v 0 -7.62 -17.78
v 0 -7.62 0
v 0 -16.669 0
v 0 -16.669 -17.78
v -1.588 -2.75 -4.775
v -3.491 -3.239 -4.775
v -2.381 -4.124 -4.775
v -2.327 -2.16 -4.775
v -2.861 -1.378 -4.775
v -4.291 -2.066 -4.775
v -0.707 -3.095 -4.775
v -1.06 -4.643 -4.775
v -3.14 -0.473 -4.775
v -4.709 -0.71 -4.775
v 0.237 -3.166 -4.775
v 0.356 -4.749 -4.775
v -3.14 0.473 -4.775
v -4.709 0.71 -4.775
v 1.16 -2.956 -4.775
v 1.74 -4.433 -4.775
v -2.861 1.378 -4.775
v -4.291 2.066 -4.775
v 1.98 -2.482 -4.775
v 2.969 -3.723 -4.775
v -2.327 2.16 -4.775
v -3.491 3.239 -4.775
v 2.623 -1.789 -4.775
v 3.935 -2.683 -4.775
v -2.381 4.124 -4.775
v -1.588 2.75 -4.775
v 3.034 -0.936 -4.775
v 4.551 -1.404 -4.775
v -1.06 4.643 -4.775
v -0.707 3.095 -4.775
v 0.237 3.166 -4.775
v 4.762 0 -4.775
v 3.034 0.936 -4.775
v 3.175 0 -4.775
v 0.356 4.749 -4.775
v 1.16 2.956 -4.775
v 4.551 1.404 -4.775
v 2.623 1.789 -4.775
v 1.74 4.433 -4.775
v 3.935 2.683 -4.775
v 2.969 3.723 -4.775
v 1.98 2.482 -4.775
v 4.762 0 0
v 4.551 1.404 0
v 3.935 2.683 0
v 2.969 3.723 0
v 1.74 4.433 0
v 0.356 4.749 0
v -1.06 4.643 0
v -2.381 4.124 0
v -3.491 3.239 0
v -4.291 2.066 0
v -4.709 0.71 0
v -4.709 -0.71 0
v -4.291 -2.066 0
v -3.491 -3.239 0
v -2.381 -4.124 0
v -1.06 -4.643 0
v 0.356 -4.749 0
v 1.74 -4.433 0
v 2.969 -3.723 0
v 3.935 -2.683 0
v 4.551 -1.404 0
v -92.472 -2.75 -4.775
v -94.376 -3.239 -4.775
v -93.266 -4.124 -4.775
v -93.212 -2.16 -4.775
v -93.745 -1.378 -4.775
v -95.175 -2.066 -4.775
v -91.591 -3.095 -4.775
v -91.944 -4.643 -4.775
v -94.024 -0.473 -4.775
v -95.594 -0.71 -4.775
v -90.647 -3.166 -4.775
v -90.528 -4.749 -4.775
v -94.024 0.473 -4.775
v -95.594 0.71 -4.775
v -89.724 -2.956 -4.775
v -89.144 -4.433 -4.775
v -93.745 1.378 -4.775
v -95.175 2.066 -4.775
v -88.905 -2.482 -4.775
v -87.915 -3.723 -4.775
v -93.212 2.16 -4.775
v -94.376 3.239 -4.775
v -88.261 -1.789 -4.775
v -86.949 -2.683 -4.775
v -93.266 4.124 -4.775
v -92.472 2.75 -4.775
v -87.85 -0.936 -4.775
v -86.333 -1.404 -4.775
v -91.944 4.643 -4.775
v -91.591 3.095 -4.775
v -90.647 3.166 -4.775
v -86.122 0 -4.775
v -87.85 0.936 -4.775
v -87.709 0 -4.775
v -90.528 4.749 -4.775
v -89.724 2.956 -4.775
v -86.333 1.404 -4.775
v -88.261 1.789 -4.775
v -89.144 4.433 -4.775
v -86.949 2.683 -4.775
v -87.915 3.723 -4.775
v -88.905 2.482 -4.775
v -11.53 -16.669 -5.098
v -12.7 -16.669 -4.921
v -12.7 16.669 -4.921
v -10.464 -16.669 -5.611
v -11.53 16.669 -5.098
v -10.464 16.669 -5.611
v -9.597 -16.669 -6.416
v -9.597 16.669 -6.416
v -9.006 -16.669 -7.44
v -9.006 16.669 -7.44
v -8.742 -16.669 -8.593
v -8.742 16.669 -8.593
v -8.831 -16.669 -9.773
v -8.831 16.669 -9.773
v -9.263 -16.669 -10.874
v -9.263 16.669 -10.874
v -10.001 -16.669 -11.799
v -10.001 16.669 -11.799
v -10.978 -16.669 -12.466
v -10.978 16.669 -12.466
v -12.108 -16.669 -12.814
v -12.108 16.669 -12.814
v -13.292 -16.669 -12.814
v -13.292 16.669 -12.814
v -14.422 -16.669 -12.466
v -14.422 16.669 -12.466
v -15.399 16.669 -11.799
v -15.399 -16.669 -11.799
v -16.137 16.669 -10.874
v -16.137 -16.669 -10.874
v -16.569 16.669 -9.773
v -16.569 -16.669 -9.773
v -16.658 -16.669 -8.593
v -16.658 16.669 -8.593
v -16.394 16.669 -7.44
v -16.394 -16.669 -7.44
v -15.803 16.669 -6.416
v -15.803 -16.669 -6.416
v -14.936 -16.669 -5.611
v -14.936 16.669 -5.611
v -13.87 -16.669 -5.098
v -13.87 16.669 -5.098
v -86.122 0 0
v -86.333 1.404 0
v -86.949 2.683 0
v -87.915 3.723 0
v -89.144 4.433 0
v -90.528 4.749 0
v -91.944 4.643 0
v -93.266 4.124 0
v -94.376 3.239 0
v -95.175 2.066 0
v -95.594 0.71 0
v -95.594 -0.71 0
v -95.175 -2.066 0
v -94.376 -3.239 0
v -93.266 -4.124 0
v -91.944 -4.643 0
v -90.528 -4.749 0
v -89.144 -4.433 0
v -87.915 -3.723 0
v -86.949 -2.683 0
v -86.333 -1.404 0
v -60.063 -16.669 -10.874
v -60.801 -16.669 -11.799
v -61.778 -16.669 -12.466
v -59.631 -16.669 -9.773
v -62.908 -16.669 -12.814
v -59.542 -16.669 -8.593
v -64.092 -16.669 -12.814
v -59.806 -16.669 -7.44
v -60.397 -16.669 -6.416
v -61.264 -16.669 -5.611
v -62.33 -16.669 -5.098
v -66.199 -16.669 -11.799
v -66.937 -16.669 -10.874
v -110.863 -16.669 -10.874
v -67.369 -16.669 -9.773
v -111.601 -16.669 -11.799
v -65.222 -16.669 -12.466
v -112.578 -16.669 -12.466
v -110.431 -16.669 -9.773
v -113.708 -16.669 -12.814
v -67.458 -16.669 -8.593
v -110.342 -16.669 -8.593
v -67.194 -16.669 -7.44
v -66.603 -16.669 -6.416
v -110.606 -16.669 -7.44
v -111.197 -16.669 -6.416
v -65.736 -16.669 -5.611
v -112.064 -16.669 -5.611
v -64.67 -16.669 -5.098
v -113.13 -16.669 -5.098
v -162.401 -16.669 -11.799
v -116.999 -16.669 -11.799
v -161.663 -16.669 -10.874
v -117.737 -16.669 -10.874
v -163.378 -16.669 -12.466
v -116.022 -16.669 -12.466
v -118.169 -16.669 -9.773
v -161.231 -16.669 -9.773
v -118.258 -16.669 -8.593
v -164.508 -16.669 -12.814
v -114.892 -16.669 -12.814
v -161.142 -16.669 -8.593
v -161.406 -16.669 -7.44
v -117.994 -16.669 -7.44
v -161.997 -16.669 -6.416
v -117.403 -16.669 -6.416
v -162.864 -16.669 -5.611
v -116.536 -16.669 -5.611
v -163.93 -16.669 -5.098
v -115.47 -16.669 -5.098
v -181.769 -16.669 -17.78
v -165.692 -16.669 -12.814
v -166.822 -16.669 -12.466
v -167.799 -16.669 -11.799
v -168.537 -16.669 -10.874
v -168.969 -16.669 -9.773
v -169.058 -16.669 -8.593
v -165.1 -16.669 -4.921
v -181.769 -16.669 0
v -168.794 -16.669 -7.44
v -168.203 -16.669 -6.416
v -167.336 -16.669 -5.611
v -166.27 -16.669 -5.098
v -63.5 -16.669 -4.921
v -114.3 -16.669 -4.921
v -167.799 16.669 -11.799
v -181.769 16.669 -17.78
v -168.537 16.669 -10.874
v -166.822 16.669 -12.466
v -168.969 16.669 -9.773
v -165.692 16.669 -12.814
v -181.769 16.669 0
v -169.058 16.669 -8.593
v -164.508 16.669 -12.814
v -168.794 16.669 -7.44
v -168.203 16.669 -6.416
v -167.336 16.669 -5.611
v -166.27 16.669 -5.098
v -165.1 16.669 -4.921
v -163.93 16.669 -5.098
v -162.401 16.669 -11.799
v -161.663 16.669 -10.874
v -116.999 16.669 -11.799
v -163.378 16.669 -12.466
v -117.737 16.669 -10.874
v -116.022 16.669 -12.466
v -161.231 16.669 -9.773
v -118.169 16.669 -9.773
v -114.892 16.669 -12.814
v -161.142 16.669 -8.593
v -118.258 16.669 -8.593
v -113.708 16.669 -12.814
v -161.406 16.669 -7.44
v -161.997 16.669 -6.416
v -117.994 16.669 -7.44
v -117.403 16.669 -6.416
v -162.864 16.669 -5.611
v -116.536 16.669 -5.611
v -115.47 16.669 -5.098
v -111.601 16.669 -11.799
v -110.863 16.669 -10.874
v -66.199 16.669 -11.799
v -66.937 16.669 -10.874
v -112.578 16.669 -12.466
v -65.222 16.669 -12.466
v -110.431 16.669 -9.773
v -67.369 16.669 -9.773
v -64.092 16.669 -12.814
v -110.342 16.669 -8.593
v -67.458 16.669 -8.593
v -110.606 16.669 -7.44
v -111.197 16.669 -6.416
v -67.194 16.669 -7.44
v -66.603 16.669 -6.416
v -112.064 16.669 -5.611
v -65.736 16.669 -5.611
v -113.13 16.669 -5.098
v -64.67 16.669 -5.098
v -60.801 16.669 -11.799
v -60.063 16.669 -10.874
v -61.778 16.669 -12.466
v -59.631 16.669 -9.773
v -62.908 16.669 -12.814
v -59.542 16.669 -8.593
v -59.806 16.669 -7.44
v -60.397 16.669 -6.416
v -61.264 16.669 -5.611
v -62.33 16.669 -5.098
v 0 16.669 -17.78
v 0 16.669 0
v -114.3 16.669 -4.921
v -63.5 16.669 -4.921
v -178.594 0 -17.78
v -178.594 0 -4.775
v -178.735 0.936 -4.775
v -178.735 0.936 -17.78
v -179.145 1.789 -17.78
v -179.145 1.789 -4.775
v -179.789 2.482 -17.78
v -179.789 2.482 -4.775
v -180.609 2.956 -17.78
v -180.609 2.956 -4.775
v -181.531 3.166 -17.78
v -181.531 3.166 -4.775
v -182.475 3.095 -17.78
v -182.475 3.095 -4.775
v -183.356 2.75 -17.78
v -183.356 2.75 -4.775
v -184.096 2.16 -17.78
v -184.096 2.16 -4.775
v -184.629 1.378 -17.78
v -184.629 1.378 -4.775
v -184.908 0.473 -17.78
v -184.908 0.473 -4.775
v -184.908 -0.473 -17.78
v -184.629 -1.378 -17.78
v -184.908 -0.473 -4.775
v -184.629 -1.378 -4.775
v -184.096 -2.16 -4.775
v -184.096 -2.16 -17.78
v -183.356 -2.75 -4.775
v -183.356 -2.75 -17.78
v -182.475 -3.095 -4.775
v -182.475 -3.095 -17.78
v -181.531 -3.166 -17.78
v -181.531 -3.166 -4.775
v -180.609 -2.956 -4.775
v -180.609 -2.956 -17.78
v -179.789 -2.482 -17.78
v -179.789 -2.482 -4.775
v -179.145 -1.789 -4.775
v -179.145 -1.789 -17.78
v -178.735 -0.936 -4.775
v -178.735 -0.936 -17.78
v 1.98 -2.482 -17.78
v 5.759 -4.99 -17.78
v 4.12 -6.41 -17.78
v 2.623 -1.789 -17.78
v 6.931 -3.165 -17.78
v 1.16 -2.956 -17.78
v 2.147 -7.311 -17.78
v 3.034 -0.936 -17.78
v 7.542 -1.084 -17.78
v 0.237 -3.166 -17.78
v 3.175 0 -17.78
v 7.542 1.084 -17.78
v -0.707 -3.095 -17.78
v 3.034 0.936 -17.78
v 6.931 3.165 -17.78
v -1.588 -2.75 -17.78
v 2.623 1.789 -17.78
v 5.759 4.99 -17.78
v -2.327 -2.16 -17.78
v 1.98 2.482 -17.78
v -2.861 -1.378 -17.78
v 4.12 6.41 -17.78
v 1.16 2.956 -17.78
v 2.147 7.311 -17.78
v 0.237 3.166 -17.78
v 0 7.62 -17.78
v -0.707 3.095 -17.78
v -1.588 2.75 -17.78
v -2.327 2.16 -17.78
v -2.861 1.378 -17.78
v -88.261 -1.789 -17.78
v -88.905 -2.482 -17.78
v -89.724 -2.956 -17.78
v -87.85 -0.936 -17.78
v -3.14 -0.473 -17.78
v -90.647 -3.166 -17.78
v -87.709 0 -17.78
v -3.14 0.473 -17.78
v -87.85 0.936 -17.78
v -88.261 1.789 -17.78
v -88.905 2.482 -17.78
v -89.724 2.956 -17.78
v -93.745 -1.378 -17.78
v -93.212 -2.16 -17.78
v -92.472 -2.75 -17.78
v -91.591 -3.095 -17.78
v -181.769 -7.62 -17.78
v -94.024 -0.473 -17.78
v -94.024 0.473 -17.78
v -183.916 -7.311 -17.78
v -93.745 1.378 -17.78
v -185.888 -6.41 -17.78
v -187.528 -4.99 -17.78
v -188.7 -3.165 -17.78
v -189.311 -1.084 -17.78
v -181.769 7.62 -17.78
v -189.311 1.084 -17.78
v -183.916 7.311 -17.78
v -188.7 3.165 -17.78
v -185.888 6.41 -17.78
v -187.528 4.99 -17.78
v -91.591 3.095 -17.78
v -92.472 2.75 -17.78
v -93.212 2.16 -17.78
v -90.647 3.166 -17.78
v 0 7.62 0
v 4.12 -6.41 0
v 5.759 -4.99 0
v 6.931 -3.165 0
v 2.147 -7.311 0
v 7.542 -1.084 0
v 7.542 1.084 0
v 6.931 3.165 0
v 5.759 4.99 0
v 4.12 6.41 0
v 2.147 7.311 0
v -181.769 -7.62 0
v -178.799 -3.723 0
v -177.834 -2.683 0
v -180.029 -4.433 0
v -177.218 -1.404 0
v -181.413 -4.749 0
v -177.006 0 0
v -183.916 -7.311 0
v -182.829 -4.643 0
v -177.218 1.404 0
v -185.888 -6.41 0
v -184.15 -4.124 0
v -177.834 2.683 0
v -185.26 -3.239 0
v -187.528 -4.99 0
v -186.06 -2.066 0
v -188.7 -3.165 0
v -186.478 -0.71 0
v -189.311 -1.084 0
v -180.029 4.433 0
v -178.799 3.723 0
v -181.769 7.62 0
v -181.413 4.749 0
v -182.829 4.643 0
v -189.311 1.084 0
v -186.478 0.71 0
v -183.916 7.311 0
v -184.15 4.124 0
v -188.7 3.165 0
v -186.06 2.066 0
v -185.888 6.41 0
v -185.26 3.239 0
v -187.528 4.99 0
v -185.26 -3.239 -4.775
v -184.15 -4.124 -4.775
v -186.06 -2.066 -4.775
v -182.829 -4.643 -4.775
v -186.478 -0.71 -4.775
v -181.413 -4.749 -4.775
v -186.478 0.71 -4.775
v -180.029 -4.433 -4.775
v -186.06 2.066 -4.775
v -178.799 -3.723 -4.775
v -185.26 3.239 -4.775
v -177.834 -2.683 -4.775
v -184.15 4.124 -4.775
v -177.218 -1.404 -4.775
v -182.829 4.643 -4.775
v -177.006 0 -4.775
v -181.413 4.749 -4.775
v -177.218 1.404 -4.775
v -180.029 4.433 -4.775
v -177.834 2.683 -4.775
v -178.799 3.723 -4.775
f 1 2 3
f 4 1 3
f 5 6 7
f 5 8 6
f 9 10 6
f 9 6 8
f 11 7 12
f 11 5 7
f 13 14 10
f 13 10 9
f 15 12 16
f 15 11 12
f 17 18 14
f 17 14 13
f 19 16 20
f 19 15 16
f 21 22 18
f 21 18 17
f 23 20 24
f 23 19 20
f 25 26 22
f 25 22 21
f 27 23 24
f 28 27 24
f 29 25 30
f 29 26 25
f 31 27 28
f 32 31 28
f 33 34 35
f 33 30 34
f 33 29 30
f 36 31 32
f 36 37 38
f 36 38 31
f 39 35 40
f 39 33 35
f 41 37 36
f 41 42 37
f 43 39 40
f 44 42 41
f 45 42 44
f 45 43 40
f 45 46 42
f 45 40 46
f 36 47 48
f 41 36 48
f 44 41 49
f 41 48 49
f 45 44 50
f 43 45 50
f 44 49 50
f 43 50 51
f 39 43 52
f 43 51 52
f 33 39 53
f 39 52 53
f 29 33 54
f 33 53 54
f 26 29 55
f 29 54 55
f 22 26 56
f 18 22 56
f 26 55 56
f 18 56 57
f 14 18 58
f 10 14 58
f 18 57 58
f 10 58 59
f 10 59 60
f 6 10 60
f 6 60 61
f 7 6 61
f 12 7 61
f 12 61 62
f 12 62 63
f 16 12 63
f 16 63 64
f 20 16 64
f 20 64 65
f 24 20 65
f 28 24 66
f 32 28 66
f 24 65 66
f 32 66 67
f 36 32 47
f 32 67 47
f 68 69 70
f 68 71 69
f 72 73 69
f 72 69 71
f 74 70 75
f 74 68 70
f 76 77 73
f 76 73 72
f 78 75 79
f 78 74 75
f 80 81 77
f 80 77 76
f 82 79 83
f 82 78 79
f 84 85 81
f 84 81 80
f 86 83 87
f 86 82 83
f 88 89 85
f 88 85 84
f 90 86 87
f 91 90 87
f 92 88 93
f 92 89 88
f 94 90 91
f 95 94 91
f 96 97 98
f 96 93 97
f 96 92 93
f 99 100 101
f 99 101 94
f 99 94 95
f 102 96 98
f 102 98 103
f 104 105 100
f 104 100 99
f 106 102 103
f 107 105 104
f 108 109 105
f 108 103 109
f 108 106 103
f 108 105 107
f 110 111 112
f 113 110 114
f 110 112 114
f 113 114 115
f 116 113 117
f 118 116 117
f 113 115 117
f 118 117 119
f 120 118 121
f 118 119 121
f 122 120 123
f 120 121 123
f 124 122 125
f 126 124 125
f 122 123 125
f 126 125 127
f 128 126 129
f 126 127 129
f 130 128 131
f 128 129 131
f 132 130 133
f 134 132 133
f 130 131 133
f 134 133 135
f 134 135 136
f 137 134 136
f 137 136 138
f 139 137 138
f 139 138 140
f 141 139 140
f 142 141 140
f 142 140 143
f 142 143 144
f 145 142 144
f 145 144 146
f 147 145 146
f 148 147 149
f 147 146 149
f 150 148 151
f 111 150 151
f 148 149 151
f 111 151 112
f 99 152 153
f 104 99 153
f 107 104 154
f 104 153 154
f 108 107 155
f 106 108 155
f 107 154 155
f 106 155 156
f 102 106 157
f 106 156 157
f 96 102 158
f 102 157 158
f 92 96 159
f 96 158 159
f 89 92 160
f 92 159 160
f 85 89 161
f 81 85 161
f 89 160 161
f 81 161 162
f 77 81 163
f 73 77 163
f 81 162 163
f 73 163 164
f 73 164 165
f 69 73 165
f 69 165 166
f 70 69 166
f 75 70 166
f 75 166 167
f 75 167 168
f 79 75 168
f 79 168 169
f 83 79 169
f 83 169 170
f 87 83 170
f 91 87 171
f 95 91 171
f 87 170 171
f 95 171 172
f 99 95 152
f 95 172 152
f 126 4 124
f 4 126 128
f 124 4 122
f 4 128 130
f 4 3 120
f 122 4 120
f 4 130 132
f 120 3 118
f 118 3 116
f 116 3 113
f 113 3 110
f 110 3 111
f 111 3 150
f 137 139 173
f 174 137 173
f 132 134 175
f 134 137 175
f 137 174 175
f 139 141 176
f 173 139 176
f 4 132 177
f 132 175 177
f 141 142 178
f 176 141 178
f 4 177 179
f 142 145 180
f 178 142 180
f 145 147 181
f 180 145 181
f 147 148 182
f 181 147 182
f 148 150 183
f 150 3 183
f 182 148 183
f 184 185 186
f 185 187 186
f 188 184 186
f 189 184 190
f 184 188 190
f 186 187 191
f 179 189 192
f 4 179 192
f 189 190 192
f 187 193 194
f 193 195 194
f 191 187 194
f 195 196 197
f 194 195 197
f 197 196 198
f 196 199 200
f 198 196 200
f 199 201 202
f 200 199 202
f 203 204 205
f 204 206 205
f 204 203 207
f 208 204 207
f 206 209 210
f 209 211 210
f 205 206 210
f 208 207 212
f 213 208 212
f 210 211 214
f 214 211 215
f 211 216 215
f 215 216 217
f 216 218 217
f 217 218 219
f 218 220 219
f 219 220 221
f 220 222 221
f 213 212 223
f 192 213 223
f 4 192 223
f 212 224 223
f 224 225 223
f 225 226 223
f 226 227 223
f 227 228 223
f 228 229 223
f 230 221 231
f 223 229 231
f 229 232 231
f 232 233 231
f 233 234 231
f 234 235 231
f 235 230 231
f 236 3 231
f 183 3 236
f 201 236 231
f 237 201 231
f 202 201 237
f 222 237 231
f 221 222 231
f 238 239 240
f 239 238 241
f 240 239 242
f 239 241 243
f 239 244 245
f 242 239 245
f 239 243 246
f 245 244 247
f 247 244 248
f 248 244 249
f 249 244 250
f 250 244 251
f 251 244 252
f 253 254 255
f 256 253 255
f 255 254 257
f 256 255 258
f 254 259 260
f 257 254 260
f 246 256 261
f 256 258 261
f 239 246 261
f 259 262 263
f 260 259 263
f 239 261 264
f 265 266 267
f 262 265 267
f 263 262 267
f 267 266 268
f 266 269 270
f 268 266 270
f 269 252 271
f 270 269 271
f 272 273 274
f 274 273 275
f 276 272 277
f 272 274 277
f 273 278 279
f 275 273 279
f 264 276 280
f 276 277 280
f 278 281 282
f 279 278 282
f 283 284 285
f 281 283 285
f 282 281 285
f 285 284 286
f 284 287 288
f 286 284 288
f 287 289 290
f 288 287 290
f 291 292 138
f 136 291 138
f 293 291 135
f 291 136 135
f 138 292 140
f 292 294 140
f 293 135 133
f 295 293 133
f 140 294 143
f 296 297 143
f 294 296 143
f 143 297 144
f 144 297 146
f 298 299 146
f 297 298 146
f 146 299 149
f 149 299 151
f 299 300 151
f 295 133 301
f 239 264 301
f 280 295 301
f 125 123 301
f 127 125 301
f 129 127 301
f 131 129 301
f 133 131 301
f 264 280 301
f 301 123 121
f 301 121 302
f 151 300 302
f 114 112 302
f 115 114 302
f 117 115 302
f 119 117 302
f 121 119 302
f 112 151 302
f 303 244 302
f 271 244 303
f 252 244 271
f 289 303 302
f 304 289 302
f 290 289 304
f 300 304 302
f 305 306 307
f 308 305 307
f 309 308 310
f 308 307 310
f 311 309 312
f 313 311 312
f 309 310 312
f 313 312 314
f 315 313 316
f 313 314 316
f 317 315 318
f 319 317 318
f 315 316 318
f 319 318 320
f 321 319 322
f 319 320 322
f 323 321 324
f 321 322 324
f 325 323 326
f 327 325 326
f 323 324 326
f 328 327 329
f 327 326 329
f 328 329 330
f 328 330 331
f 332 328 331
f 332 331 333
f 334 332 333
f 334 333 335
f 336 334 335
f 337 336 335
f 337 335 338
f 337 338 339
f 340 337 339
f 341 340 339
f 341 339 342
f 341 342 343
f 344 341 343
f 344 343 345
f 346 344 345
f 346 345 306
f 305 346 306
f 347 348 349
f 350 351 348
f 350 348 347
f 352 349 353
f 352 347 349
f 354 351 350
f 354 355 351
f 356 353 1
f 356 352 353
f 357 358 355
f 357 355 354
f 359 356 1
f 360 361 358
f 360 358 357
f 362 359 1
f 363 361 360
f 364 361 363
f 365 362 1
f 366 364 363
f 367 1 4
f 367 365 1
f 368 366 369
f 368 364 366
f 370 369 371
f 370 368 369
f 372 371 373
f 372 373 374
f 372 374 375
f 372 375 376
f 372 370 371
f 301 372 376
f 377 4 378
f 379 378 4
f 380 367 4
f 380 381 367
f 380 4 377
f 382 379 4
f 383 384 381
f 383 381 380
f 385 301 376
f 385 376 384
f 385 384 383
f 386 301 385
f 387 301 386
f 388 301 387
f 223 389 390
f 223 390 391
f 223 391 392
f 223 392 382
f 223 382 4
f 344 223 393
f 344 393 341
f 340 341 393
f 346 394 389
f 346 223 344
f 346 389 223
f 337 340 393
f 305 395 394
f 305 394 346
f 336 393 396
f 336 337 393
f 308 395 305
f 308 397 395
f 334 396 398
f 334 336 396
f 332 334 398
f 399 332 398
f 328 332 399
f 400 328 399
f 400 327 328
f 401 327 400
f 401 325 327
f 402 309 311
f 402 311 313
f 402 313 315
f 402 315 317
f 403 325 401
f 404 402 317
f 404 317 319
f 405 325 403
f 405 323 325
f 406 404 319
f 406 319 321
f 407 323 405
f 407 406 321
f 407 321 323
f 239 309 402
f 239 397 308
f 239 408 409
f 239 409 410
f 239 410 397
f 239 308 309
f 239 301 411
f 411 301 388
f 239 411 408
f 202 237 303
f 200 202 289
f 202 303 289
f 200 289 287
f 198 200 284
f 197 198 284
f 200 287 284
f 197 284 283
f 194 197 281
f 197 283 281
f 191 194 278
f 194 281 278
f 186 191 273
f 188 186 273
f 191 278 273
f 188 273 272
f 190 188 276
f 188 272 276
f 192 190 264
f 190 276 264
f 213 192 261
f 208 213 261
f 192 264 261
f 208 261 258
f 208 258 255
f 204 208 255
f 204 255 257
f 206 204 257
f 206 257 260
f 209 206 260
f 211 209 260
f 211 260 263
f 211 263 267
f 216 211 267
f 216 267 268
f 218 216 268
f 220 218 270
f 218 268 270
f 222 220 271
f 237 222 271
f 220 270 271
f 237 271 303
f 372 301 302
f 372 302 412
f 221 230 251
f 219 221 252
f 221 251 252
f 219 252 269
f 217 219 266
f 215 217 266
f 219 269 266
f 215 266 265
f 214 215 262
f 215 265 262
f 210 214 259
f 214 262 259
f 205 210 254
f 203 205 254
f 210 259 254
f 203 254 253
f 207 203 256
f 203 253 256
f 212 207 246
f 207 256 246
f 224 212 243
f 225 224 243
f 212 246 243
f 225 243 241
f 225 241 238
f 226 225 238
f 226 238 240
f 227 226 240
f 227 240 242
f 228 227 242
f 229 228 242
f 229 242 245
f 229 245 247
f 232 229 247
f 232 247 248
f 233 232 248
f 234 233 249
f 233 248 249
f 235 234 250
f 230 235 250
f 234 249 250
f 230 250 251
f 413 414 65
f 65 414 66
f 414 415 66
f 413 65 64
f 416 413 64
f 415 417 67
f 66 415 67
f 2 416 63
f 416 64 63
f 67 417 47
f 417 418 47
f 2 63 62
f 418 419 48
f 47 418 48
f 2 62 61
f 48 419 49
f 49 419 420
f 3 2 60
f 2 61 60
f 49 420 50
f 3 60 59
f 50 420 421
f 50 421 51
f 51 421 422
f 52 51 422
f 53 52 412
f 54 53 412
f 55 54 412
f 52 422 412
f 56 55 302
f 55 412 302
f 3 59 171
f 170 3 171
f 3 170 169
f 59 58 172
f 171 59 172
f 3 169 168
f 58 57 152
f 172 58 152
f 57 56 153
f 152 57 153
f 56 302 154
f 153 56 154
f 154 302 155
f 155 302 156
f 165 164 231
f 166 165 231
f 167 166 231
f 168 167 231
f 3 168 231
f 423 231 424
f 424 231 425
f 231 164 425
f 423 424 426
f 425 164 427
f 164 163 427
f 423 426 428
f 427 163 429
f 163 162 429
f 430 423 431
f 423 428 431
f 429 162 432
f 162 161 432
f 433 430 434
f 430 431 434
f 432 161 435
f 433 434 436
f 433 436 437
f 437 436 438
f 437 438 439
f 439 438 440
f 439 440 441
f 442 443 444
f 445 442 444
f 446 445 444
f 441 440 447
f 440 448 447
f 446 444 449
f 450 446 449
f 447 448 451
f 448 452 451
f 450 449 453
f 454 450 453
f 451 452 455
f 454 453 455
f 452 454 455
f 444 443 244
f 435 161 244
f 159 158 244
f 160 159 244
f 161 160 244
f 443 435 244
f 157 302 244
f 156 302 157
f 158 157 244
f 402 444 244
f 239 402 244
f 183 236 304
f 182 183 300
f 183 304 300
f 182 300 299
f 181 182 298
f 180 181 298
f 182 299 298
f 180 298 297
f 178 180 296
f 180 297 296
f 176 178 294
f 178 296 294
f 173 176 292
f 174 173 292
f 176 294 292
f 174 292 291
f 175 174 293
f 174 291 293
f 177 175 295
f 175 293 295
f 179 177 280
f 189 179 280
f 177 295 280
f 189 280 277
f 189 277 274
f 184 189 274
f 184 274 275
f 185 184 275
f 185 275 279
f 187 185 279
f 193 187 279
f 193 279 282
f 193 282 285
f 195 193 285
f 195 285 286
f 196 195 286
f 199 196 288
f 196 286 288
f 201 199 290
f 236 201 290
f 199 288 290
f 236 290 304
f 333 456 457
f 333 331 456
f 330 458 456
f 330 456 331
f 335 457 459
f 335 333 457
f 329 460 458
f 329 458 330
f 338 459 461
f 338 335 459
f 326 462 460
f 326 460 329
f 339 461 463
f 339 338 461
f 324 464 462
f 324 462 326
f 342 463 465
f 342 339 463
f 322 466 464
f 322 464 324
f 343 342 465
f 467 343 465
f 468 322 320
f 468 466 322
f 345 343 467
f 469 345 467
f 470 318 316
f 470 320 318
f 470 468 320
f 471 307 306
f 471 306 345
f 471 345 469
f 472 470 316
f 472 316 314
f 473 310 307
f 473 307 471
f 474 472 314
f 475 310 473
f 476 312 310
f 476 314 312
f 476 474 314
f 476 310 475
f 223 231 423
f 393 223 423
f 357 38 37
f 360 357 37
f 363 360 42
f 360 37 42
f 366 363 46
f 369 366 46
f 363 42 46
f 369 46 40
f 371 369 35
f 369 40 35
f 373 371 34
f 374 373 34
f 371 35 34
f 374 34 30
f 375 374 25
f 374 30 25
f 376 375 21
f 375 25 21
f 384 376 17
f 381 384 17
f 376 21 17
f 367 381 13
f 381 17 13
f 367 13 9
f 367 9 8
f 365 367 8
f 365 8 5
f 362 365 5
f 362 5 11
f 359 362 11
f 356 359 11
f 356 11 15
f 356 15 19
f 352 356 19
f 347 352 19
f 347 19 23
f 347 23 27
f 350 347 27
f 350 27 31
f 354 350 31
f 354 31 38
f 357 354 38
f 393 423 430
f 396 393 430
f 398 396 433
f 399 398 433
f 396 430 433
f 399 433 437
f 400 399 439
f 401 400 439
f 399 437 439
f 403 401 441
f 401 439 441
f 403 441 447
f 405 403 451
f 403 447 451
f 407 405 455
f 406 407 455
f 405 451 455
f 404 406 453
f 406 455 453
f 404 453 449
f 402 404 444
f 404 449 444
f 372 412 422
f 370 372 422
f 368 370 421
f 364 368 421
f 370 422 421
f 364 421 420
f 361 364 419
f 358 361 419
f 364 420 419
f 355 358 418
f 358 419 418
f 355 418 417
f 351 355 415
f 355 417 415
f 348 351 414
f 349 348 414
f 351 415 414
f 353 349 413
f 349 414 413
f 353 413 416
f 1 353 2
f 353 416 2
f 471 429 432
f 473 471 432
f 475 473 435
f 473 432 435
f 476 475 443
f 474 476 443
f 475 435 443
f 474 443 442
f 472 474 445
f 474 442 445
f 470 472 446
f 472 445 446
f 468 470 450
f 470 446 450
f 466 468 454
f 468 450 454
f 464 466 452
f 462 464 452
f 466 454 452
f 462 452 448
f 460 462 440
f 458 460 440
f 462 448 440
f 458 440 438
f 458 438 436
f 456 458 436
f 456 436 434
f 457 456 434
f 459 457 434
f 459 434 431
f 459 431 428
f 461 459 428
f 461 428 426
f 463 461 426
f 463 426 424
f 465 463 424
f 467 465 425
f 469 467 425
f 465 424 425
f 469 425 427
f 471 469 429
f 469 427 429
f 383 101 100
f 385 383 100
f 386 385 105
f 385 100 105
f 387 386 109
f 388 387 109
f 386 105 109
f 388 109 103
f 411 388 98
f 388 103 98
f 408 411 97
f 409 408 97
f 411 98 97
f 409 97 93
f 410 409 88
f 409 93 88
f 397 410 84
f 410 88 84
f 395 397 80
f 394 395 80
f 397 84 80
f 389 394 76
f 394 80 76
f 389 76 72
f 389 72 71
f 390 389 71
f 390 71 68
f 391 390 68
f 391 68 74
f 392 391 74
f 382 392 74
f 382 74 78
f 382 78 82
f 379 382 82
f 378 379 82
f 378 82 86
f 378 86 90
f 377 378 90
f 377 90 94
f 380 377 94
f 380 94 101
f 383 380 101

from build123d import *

# Parameters (mm, degrees)
SKETCH1_R           = 3.175
BOSS_EXTRUDE1_DEPTH = 17.78
SKETCH2_R           = 3.96875
CUT_EXTRUDE1_DEPTH  = 33.3375
SKETCH3_R           = 4.7625
CUT_EXTRUDE2_DEPTH  = 4.7752


with BuildPart() as part:
    # Sketch1 → Boss-Extrude1 (new body)
    with BuildSketch(Plane.XY):
        with BuildLine():
            Line((0, 16.66875), (0, 7.62))
            ThreePointArc((0, 7.62), (7.62, 0), (0, -7.62))
            Line((0, -7.62), (0, -16.66875))
            Line((0, -16.66875), (-181.76875, -16.66875))
            Line((-181.76875, -16.66875), (-181.76875, -7.62))
            ThreePointArc((-181.76875, -7.62), (-189.38875, 0), (-181.76875, 7.62))
            Line((-181.76875, 7.62), (-181.76875, 16.66875))
            Line((-181.76875, 16.66875), (0, 16.66875))
        make_face()
        Circle(SKETCH1_R, mode=Mode.SUBTRACT)
        with Locations((-181.76875, 0)):
            Circle(SKETCH1_R, mode=Mode.SUBTRACT)
        with Locations((-90.884375, 0)):
            Circle(SKETCH1_R, mode=Mode.SUBTRACT)
    extrude(amount=-BOSS_EXTRUDE1_DEPTH)

    # Sketch2 → Cut-Extrude1 (cut)
    with BuildSketch(Plane(origin=(0, 16.66875, 0), x_dir=(1, 0, 0), z_dir=(0, 1, 0))):
        with Locations(Location((-12.7, 8.89, 0), (0, 0, 270))):
            Circle(SKETCH2_R)
        with Locations(Location((-63.5, 8.89, 0), (0, 0, 270))):
            Circle(SKETCH2_R)
        with Locations(Location((-114.3, 8.89, 0), (0, 0, 270))):
            Circle(SKETCH2_R)
        with Locations(Location((-165.1, 8.89, 0), (0, 0, 270))):
            Circle(SKETCH2_R)
    extrude(amount=-CUT_EXTRUDE1_DEPTH, mode=Mode.SUBTRACT)

    # Sketch3 → Cut-Extrude2 (cut)
    with BuildSketch(Plane.XY):
        Circle(SKETCH3_R)
        with Locations((-90.884375, 0)):
            Circle(SKETCH3_R)
        with Locations((-181.76875, 0)):
            Circle(SKETCH3_R)
    extrude(amount=-CUT_EXTRUDE2_DEPTH, mode=Mode.SUBTRACT)


solid = part.part
